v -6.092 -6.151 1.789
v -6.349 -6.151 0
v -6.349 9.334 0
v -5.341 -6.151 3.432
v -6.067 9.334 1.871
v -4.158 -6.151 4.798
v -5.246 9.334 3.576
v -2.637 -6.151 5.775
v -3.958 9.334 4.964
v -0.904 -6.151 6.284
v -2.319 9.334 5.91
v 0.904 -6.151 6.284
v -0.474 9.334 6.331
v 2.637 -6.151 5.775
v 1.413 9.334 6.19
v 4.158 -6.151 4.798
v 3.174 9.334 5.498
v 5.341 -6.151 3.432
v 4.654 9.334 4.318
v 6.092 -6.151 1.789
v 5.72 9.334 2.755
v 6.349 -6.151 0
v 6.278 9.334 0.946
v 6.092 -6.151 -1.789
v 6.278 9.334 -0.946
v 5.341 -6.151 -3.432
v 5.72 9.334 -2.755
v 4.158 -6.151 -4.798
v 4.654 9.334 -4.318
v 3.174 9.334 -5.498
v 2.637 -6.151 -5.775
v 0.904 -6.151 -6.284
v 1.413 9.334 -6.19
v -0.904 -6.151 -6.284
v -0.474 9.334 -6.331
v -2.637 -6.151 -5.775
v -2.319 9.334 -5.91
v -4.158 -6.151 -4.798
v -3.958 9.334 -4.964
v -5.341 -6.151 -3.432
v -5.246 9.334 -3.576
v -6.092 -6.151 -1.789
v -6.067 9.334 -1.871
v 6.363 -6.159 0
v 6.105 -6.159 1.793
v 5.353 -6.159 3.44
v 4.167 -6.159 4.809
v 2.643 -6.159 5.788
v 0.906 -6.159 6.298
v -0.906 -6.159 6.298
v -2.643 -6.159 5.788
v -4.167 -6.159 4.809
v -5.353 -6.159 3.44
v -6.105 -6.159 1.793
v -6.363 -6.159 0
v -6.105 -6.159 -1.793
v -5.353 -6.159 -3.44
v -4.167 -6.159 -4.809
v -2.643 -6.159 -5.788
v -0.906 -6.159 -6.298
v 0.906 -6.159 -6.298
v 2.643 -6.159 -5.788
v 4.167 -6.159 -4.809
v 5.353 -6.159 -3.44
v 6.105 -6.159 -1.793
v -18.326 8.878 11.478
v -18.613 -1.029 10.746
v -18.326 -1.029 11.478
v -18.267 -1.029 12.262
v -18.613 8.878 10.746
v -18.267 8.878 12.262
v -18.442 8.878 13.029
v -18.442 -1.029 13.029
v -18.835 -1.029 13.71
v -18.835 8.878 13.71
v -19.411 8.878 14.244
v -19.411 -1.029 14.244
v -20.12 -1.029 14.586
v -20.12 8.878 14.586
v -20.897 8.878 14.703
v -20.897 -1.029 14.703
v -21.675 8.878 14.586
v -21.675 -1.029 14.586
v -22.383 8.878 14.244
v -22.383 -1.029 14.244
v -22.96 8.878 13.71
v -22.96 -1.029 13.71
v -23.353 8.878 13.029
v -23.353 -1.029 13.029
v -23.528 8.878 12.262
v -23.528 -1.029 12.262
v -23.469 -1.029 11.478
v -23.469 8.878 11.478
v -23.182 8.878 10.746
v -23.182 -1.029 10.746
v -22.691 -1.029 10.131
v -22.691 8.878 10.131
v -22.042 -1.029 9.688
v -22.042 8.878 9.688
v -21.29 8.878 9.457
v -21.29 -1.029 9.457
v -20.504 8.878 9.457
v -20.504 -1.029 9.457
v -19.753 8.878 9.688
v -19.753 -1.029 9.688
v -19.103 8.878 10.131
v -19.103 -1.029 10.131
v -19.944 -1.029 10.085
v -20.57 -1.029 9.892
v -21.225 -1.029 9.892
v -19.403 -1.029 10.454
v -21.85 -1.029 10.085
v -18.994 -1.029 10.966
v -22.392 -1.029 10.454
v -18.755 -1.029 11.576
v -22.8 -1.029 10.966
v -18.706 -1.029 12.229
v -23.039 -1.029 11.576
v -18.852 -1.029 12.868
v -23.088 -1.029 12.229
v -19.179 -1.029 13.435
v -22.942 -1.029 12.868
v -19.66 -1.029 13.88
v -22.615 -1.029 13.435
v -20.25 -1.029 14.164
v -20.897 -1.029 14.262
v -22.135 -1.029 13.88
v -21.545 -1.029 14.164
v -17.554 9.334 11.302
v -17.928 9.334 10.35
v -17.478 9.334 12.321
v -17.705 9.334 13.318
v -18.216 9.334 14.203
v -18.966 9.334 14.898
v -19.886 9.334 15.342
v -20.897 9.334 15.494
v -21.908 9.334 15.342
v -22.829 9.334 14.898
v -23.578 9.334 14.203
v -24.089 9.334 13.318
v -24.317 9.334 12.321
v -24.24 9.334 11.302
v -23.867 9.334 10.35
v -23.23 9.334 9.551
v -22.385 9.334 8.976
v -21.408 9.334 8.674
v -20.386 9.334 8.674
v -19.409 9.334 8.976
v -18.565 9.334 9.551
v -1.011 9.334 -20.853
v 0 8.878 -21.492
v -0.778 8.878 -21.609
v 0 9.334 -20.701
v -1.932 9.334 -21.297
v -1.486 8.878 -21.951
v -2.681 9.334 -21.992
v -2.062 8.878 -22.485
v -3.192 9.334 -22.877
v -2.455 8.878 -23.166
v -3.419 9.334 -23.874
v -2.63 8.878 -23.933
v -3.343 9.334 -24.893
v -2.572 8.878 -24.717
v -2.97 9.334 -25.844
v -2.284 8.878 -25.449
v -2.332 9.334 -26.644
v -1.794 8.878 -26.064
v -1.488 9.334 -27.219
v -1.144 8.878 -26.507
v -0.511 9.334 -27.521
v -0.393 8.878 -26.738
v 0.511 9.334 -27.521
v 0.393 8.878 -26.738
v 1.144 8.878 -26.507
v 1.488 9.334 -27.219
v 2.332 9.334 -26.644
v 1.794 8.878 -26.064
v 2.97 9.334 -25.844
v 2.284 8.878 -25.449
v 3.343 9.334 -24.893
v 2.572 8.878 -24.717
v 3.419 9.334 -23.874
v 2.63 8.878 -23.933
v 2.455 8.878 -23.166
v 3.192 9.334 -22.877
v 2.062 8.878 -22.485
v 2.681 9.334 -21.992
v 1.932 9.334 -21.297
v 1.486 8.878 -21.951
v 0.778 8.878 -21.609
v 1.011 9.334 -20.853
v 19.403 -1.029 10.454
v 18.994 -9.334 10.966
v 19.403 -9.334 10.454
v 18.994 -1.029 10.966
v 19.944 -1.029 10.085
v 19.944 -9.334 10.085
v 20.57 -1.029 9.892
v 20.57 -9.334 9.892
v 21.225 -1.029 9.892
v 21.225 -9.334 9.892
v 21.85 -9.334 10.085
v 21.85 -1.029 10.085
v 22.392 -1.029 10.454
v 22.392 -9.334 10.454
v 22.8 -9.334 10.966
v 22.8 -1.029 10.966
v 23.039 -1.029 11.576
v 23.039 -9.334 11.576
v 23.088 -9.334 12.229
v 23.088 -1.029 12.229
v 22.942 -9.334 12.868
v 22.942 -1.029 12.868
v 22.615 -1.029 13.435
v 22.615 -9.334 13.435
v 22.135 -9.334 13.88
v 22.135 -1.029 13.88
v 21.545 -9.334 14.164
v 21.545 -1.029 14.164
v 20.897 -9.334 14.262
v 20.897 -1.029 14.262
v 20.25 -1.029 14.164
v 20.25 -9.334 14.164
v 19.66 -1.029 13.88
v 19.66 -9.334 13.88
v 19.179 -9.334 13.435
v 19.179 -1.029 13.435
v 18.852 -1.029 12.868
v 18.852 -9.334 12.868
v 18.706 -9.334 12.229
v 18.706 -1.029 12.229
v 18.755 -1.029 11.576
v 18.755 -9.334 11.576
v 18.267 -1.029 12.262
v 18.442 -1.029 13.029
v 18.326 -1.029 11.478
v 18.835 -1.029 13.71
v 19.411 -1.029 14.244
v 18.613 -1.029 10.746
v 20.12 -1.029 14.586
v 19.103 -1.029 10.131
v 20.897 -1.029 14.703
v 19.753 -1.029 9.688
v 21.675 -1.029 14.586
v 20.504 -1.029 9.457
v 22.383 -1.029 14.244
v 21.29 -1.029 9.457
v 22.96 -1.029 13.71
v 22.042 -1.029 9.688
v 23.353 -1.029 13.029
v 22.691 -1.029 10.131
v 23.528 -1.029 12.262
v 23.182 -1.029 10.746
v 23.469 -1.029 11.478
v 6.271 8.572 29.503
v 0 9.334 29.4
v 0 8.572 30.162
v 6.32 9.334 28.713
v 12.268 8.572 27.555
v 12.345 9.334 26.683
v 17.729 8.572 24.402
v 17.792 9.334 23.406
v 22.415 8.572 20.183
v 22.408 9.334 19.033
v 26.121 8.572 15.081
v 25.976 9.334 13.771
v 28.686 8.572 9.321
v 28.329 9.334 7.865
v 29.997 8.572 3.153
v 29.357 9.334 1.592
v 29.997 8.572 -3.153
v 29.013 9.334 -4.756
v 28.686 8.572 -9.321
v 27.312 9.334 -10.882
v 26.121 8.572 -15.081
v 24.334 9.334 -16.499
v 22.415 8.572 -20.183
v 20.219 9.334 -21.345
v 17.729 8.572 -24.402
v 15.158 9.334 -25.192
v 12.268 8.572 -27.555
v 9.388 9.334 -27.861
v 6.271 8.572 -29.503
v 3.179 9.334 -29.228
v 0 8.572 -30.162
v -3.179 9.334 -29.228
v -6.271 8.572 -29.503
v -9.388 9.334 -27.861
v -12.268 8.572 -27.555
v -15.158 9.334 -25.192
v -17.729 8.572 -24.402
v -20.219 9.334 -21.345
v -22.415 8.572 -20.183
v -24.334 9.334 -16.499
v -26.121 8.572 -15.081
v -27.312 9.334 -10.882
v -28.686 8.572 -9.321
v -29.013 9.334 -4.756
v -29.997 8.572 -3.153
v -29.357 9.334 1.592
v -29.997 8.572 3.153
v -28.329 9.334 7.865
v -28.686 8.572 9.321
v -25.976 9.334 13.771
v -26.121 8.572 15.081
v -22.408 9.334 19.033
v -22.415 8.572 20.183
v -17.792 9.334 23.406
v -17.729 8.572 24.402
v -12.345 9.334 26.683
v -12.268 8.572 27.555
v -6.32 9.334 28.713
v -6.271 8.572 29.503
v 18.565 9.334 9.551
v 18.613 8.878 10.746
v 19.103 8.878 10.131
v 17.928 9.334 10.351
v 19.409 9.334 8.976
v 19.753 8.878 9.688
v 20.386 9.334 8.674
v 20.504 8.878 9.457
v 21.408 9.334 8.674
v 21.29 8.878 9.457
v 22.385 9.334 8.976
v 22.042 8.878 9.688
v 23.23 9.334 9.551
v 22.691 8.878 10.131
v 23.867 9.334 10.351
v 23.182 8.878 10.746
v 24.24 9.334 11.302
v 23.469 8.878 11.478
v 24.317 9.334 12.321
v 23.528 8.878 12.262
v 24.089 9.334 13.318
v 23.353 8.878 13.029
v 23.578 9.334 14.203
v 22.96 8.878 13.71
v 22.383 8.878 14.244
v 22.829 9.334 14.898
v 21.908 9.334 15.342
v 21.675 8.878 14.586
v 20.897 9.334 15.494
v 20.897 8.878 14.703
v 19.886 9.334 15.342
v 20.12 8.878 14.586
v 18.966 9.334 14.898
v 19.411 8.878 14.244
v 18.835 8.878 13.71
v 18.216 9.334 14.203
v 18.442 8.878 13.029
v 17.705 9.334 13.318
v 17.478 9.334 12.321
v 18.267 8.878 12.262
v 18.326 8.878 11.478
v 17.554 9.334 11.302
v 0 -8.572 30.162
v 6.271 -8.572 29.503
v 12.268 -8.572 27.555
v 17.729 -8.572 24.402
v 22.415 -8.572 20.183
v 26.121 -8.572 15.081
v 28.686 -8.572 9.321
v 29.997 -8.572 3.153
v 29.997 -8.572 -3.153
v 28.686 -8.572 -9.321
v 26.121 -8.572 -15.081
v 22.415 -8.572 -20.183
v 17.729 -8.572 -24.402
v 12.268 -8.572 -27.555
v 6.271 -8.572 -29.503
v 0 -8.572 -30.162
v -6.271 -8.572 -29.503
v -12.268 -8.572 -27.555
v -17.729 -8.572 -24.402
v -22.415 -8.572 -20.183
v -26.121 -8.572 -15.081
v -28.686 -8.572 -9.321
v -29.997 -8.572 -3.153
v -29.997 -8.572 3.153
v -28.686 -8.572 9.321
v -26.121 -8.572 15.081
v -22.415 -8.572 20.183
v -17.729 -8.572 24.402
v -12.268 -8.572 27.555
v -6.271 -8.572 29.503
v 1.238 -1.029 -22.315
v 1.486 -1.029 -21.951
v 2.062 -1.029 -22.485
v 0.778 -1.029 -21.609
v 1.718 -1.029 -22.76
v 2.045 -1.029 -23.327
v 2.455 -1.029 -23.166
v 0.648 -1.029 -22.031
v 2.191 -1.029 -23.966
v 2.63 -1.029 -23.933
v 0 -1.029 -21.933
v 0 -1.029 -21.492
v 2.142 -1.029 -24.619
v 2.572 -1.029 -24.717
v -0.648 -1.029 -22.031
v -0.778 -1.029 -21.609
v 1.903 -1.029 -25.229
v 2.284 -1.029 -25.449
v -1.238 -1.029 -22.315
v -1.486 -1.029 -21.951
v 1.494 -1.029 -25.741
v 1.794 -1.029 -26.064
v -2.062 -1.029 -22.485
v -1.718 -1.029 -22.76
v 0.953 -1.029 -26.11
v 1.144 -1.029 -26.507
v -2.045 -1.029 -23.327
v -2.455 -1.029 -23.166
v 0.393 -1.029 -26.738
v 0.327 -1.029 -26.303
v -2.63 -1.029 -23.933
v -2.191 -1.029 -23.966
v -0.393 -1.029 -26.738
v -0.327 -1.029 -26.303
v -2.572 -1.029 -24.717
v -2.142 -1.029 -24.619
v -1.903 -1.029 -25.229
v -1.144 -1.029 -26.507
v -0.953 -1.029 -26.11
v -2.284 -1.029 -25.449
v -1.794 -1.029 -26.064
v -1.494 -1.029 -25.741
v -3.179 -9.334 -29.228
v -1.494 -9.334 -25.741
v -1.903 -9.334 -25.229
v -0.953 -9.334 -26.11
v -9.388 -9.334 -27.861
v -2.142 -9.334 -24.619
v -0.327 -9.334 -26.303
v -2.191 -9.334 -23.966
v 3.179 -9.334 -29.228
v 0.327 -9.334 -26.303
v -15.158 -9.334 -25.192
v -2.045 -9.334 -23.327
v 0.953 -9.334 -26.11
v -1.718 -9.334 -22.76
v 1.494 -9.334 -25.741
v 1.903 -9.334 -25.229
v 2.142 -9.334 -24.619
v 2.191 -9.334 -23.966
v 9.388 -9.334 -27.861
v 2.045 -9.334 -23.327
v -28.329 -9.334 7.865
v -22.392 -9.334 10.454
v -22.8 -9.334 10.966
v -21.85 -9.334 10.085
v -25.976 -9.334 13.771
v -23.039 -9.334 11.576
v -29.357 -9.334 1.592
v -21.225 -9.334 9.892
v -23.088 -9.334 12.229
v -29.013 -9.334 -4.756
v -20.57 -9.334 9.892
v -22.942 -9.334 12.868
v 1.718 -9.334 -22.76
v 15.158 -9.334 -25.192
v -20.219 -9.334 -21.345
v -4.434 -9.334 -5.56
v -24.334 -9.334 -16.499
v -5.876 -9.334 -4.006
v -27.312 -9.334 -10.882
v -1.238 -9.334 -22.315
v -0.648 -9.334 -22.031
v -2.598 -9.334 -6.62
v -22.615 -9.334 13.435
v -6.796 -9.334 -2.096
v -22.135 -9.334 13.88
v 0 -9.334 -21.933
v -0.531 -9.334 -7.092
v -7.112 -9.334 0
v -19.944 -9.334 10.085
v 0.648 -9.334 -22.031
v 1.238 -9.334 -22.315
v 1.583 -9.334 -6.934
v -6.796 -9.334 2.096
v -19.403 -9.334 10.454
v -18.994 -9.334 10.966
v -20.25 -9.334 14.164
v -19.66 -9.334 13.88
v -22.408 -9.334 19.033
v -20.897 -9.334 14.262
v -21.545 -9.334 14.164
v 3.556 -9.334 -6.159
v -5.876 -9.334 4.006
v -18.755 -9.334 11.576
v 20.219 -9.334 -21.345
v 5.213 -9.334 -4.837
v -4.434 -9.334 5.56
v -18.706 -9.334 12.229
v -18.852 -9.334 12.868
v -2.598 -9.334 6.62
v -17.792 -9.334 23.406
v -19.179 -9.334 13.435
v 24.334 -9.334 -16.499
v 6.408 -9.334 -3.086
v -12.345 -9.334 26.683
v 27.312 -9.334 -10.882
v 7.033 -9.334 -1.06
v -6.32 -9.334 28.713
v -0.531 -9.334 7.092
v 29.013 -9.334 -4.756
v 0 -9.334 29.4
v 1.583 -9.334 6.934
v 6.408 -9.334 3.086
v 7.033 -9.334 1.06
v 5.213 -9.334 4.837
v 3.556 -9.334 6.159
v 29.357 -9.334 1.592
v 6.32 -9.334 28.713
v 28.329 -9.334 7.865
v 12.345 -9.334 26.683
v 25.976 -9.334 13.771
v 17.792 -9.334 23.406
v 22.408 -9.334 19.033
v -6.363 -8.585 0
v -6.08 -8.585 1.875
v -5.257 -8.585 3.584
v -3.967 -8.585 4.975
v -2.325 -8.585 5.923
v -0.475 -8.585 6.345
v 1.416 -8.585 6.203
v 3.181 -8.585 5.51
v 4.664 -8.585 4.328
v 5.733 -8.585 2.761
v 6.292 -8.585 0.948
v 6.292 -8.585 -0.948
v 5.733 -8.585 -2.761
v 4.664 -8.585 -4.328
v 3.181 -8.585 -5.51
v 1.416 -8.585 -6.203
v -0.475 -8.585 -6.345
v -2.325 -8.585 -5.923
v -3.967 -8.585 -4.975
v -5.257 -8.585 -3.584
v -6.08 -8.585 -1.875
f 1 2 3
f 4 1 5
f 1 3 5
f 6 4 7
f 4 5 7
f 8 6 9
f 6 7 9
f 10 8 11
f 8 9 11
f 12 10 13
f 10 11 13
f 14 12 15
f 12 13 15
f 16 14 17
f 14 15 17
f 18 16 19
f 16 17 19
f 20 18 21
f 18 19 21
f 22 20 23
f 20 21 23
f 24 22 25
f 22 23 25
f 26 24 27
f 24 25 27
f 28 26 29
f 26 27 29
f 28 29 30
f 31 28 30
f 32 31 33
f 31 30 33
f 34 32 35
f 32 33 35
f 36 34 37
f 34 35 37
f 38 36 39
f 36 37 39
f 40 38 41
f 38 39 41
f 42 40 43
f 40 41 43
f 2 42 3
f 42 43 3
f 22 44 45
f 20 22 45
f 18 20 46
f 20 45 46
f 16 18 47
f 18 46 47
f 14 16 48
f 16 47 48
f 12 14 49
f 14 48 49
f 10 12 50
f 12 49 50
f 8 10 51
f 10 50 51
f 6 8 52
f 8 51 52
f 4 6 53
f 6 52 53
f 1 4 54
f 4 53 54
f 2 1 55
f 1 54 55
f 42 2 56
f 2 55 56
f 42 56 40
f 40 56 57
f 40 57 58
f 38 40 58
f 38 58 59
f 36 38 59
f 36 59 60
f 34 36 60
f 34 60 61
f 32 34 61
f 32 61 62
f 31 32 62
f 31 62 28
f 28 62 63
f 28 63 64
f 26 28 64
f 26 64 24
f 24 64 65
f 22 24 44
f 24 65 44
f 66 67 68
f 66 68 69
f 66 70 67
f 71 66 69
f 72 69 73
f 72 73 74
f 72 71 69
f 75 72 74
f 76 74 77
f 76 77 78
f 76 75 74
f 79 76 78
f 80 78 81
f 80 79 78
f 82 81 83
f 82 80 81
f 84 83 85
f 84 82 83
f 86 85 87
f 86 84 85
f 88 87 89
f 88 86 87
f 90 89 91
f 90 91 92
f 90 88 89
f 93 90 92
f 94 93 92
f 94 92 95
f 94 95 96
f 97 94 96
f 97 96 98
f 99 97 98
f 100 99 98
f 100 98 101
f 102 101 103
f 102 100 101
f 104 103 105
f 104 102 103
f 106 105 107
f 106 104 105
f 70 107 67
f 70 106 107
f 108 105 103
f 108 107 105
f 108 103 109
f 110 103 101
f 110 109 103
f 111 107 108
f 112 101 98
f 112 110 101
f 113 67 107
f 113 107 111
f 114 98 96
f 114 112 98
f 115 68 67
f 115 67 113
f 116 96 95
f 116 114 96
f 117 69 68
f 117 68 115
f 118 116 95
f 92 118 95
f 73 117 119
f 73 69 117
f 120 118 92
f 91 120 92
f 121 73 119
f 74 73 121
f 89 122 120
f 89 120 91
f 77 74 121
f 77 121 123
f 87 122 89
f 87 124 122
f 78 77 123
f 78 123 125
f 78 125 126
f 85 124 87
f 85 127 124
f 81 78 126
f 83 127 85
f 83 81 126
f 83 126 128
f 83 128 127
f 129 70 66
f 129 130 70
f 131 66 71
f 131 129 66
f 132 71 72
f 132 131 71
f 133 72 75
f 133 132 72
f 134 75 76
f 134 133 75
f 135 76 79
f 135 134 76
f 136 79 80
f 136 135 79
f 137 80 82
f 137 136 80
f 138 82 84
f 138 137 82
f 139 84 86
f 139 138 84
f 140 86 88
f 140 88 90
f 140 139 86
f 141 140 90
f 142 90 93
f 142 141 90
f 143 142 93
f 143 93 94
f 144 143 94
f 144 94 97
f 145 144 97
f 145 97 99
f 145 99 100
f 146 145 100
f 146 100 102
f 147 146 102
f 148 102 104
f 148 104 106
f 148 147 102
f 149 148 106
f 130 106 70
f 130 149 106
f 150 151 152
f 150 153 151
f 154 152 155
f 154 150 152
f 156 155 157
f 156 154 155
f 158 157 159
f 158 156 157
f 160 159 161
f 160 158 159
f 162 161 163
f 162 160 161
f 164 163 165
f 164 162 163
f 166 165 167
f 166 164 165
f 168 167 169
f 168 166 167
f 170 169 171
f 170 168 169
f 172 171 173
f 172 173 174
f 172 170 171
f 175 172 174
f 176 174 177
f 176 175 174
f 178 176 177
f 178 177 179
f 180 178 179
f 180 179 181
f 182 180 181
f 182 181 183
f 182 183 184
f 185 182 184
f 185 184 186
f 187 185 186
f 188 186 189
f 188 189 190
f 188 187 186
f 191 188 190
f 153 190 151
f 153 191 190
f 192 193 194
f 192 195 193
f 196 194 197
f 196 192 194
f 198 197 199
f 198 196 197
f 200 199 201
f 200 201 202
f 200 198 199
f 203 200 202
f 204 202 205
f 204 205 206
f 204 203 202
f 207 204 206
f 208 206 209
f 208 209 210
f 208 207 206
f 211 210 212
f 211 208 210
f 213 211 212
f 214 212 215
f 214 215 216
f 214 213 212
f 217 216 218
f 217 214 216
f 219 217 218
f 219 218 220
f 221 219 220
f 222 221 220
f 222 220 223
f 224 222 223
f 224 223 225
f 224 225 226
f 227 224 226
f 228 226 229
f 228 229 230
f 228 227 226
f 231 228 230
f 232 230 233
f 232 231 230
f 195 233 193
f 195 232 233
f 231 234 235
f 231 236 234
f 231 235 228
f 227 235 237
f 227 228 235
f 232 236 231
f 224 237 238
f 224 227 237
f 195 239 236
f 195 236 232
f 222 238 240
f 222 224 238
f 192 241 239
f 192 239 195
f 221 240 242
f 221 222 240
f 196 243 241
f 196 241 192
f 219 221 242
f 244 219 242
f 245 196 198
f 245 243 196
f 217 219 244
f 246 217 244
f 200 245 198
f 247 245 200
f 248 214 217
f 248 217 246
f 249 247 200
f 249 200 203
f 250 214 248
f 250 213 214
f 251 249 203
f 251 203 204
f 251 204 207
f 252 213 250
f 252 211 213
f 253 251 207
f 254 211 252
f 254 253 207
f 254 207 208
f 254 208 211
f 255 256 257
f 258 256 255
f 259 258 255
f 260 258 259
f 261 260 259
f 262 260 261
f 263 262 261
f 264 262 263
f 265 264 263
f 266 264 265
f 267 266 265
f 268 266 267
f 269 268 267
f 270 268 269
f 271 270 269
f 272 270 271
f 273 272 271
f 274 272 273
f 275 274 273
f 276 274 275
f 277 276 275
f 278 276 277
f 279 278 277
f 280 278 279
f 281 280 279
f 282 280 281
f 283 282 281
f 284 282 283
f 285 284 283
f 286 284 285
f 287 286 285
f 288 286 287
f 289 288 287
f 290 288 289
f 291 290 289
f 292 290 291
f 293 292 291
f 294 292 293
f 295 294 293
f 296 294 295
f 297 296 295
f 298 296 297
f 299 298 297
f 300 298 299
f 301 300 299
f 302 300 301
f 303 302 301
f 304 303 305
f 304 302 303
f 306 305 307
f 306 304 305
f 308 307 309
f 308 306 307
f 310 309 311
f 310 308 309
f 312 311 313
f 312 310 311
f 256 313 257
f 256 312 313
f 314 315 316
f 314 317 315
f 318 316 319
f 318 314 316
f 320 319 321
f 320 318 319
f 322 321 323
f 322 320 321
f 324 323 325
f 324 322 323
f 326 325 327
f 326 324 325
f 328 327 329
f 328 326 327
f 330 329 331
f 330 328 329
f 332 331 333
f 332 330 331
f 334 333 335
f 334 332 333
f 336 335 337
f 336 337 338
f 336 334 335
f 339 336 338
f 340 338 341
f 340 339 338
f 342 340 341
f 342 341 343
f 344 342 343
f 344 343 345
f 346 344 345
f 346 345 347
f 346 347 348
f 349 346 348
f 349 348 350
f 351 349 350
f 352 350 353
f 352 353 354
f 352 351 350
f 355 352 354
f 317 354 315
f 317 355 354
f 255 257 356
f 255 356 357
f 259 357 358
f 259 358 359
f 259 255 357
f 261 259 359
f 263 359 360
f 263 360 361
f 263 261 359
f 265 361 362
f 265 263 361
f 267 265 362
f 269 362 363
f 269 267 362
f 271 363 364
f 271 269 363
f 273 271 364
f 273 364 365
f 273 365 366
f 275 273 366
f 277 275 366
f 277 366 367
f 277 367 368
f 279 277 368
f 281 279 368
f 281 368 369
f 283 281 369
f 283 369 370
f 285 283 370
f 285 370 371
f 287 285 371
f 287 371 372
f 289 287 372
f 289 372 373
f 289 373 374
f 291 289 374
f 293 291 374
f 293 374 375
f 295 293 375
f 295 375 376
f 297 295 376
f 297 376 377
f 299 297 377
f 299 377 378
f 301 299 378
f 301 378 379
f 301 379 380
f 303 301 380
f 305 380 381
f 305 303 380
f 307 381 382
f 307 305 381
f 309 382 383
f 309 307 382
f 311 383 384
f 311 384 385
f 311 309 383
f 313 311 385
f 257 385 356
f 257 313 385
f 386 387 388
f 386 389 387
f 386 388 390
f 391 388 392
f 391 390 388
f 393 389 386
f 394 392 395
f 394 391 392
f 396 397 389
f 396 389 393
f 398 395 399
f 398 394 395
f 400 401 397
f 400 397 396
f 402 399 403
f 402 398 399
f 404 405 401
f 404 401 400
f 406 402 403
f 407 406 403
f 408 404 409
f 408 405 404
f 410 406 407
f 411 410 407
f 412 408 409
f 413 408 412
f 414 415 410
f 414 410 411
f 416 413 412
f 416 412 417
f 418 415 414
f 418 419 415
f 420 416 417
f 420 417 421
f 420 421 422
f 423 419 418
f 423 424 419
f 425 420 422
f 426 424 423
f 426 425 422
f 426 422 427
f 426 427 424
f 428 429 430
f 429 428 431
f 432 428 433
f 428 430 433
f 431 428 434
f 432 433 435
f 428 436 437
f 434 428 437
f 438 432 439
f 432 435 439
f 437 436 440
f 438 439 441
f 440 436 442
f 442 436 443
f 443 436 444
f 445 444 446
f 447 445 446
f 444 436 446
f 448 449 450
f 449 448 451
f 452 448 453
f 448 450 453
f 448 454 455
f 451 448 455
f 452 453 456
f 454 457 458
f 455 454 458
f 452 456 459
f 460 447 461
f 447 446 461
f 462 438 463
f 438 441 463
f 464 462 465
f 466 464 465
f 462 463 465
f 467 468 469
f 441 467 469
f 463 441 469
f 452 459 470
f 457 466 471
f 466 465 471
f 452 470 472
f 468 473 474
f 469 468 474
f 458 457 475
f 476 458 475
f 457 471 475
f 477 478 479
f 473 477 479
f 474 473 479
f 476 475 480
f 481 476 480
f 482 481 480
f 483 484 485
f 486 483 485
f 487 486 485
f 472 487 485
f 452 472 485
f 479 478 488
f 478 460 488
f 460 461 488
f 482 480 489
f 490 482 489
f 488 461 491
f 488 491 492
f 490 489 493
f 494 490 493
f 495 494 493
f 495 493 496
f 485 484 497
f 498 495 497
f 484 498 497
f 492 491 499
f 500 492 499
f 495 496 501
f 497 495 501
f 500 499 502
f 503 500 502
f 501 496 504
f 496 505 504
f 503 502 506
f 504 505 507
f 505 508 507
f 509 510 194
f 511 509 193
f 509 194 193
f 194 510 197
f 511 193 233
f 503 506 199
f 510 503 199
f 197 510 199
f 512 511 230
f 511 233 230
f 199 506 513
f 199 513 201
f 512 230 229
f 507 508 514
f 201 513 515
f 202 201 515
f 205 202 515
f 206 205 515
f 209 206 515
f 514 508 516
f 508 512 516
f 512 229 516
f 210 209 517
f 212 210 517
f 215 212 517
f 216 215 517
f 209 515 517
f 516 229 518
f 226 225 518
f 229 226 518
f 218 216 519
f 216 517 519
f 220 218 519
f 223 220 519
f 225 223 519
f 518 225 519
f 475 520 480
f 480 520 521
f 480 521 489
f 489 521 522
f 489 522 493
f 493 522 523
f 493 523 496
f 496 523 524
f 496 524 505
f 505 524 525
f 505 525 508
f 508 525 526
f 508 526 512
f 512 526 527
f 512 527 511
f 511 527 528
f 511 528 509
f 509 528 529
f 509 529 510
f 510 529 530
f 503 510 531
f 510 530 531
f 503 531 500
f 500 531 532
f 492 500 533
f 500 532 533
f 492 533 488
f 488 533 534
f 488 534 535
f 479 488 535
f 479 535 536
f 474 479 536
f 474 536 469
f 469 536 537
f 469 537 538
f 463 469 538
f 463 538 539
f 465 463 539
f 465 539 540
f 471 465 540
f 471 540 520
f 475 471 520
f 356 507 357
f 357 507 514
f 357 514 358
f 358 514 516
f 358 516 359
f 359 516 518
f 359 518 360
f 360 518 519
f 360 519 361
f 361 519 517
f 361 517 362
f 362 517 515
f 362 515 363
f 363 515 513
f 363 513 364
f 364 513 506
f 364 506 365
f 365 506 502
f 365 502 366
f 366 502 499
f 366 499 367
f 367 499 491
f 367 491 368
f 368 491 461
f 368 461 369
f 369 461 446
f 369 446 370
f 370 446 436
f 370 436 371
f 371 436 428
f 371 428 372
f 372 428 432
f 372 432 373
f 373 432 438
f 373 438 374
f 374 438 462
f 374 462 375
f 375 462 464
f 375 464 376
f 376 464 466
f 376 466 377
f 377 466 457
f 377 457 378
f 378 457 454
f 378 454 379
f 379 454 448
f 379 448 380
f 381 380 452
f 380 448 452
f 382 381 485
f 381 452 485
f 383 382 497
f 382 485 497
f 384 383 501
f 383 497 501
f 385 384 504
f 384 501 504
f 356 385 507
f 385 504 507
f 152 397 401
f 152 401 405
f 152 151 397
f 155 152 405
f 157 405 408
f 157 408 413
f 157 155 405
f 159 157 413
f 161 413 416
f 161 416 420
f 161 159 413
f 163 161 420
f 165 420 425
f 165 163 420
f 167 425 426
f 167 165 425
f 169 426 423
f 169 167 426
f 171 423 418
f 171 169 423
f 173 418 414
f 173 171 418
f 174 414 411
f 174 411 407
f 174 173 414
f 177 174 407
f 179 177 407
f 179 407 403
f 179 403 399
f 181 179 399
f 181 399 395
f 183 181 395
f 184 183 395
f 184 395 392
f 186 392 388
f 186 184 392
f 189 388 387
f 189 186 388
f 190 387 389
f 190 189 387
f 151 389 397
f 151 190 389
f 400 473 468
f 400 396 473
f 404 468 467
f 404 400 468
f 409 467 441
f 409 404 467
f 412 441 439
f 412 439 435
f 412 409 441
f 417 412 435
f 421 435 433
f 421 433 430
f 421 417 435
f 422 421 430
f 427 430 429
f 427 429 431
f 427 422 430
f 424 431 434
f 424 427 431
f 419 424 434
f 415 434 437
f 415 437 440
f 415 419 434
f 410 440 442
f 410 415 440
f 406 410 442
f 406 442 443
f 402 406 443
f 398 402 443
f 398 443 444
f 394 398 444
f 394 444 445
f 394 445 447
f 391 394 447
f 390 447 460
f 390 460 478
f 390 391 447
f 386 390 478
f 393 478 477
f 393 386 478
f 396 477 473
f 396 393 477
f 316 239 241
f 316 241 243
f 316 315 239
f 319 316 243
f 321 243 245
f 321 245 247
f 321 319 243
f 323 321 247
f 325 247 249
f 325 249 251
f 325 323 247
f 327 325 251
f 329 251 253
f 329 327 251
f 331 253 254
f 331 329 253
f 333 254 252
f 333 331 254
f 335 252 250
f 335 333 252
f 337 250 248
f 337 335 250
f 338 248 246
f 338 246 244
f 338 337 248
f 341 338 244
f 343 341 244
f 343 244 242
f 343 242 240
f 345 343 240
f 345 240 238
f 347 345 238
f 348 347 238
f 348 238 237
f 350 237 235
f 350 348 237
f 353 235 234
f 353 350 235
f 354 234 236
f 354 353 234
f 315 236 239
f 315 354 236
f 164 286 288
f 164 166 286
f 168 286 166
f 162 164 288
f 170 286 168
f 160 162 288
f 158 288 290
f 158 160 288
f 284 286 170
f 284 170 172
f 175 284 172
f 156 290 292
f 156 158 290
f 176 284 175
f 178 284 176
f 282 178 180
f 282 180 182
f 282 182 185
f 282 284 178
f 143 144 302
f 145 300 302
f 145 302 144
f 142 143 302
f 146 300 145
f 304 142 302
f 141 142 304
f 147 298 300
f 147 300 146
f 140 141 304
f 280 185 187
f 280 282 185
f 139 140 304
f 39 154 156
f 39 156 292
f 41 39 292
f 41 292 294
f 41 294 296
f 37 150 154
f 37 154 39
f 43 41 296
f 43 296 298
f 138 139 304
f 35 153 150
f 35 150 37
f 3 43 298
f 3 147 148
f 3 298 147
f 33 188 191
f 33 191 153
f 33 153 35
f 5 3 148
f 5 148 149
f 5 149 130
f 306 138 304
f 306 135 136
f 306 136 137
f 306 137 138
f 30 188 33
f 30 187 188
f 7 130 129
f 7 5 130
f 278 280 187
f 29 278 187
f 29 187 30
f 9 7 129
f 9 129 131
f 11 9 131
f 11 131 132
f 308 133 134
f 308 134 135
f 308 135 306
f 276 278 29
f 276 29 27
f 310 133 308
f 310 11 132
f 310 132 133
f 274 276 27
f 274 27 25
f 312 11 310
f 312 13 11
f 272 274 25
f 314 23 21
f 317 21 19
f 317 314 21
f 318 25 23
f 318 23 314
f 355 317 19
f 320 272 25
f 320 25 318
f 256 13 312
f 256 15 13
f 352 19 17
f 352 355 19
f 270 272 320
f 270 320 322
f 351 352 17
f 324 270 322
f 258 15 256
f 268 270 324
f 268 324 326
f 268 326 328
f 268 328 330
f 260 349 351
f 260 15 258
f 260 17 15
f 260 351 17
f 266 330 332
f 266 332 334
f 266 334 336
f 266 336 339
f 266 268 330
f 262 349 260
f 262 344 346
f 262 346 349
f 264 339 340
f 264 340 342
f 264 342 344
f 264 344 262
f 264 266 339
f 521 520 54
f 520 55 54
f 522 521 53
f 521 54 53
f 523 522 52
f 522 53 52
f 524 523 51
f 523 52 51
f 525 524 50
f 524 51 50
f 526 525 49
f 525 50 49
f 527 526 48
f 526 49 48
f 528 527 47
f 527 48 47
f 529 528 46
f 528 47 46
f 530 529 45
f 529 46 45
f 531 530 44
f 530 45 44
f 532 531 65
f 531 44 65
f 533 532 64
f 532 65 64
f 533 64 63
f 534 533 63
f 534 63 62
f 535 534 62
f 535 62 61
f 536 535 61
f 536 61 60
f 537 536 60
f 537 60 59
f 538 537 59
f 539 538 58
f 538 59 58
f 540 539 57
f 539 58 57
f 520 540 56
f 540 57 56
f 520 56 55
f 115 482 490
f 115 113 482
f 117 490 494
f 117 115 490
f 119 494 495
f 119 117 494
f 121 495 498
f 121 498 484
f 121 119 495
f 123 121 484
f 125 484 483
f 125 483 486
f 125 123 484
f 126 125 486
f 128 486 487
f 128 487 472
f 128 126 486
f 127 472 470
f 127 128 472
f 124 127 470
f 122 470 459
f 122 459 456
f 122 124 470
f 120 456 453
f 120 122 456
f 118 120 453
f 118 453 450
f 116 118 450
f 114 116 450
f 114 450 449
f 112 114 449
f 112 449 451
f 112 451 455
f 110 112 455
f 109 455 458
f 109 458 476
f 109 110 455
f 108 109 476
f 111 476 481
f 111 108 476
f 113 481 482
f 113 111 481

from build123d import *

# Parameters (mm, degrees)
SKETCH1_R                            = 30.1625
EXTRUDE1_DEPTH                       = 9.3345
CIRPATTERN1_COUNT                    = 3
F_1_2_0_5_DIAMETER_HOLE1_D           = 12.69746
F_1_2_0_5_DIAMETER_HOLE1_CSINK_D     = 14.224
F_1_2_0_5_DIAMETER_HOLE1_CSINK_ANGLE = 90
CHAMFER1_SIZE                        = 0.762
F_1_2_0_5_DIAMETER_HOLE2_D           = 12.7254
F_1_2_0_5_DIAMETER_HOLE2_DEPTH       = 3.175
F_1_2_0_5_DIAMETER_HOLE2_TIP         = 3.823095861


with BuildPart() as part:
    # Sketch1 → Extrude1 (new body, symmetric)
    with BuildSketch(Plane(origin=(0, 0, 0), x_dir=(1, 0, 0), z_dir=(0, 1, 0))):
        with Locations(Location((0, 0, 0), (0, 0, 270))):  # turned: the seam where the file's is
            Circle(SKETCH1_R)
    extrude(amount=EXTRUDE1_DEPTH, both=True)

    # Sketch2 → Tapped Hole for _8-32 Helicoil1 (revolve, cut)
    with BuildSketch(Plane(origin=(0, 9.3345, -24.13), x_dir=(0, 0, 1), z_dir=(1, 0, 0))):
        Polygon((0, 0), (0, 18.669), (2.1971, 18.669), (2.1971, 10.3632), (2.63779, 10.3632), (2.63779, 0.456805306), (3.429, 0), align=None)
    tapped_hole_for_8_32_helicoil1 = revolve(axis=Axis((0, 15.6845, -24.13), (0, -1, 0)), mode=Mode.SUBTRACT)

    # CirPattern1: Tapped Hole for _8-32 Helicoil1 ×3 about axis
    cirpattern1_axis = Axis((0, 0, 0), (0, 1, 0))
    for i in range(1, CIRPATTERN1_COUNT):
        add(tapped_hole_for_8_32_helicoil1.rotate(cirpattern1_axis, i * 360 / CIRPATTERN1_COUNT), mode=Mode.SUBTRACT)

    # 1_2 _0.5_ Diameter Hole1 (through all)
    with Locations(Plane(origin=(-26.174612808, -9.3345, 9.244261036), x_dir=(1, 0, 0), z_dir=(0, -1, 0))):
        with Locations((26.174612808, -9.244261036)):
            CounterSinkHole(F_1_2_0_5_DIAMETER_HOLE1_D / 2, F_1_2_0_5_DIAMETER_HOLE1_CSINK_D / 2, counter_sink_angle=F_1_2_0_5_DIAMETER_HOLE1_CSINK_ANGLE)

    # Chamfer1
    chamfer1_edges = [part.edges().sort_by_distance(p)[0] for p in [
        (0, -9.3345, -30.1625),
        (0, 9.3345, -30.1625),
    ]]
    chamfer(chamfer1_edges, length=CHAMFER1_SIZE)

    # 1_2 _0.5_ Diameter Hole2
    with Locations(Plane.XZ.offset(9.3345)):
        with Locations((0, 0)):
            Hole(F_1_2_0_5_DIAMETER_HOLE2_D / 2, depth=F_1_2_0_5_DIAMETER_HOLE2_DEPTH)
            with Locations((0, 0, -(F_1_2_0_5_DIAMETER_HOLE2_DEPTH + F_1_2_0_5_DIAMETER_HOLE2_TIP / 2))):  # 118° drill point
                Cone(0, F_1_2_0_5_DIAMETER_HOLE2_D / 2, F_1_2_0_5_DIAMETER_HOLE2_TIP, mode=Mode.SUBTRACT)


solid = part.part
